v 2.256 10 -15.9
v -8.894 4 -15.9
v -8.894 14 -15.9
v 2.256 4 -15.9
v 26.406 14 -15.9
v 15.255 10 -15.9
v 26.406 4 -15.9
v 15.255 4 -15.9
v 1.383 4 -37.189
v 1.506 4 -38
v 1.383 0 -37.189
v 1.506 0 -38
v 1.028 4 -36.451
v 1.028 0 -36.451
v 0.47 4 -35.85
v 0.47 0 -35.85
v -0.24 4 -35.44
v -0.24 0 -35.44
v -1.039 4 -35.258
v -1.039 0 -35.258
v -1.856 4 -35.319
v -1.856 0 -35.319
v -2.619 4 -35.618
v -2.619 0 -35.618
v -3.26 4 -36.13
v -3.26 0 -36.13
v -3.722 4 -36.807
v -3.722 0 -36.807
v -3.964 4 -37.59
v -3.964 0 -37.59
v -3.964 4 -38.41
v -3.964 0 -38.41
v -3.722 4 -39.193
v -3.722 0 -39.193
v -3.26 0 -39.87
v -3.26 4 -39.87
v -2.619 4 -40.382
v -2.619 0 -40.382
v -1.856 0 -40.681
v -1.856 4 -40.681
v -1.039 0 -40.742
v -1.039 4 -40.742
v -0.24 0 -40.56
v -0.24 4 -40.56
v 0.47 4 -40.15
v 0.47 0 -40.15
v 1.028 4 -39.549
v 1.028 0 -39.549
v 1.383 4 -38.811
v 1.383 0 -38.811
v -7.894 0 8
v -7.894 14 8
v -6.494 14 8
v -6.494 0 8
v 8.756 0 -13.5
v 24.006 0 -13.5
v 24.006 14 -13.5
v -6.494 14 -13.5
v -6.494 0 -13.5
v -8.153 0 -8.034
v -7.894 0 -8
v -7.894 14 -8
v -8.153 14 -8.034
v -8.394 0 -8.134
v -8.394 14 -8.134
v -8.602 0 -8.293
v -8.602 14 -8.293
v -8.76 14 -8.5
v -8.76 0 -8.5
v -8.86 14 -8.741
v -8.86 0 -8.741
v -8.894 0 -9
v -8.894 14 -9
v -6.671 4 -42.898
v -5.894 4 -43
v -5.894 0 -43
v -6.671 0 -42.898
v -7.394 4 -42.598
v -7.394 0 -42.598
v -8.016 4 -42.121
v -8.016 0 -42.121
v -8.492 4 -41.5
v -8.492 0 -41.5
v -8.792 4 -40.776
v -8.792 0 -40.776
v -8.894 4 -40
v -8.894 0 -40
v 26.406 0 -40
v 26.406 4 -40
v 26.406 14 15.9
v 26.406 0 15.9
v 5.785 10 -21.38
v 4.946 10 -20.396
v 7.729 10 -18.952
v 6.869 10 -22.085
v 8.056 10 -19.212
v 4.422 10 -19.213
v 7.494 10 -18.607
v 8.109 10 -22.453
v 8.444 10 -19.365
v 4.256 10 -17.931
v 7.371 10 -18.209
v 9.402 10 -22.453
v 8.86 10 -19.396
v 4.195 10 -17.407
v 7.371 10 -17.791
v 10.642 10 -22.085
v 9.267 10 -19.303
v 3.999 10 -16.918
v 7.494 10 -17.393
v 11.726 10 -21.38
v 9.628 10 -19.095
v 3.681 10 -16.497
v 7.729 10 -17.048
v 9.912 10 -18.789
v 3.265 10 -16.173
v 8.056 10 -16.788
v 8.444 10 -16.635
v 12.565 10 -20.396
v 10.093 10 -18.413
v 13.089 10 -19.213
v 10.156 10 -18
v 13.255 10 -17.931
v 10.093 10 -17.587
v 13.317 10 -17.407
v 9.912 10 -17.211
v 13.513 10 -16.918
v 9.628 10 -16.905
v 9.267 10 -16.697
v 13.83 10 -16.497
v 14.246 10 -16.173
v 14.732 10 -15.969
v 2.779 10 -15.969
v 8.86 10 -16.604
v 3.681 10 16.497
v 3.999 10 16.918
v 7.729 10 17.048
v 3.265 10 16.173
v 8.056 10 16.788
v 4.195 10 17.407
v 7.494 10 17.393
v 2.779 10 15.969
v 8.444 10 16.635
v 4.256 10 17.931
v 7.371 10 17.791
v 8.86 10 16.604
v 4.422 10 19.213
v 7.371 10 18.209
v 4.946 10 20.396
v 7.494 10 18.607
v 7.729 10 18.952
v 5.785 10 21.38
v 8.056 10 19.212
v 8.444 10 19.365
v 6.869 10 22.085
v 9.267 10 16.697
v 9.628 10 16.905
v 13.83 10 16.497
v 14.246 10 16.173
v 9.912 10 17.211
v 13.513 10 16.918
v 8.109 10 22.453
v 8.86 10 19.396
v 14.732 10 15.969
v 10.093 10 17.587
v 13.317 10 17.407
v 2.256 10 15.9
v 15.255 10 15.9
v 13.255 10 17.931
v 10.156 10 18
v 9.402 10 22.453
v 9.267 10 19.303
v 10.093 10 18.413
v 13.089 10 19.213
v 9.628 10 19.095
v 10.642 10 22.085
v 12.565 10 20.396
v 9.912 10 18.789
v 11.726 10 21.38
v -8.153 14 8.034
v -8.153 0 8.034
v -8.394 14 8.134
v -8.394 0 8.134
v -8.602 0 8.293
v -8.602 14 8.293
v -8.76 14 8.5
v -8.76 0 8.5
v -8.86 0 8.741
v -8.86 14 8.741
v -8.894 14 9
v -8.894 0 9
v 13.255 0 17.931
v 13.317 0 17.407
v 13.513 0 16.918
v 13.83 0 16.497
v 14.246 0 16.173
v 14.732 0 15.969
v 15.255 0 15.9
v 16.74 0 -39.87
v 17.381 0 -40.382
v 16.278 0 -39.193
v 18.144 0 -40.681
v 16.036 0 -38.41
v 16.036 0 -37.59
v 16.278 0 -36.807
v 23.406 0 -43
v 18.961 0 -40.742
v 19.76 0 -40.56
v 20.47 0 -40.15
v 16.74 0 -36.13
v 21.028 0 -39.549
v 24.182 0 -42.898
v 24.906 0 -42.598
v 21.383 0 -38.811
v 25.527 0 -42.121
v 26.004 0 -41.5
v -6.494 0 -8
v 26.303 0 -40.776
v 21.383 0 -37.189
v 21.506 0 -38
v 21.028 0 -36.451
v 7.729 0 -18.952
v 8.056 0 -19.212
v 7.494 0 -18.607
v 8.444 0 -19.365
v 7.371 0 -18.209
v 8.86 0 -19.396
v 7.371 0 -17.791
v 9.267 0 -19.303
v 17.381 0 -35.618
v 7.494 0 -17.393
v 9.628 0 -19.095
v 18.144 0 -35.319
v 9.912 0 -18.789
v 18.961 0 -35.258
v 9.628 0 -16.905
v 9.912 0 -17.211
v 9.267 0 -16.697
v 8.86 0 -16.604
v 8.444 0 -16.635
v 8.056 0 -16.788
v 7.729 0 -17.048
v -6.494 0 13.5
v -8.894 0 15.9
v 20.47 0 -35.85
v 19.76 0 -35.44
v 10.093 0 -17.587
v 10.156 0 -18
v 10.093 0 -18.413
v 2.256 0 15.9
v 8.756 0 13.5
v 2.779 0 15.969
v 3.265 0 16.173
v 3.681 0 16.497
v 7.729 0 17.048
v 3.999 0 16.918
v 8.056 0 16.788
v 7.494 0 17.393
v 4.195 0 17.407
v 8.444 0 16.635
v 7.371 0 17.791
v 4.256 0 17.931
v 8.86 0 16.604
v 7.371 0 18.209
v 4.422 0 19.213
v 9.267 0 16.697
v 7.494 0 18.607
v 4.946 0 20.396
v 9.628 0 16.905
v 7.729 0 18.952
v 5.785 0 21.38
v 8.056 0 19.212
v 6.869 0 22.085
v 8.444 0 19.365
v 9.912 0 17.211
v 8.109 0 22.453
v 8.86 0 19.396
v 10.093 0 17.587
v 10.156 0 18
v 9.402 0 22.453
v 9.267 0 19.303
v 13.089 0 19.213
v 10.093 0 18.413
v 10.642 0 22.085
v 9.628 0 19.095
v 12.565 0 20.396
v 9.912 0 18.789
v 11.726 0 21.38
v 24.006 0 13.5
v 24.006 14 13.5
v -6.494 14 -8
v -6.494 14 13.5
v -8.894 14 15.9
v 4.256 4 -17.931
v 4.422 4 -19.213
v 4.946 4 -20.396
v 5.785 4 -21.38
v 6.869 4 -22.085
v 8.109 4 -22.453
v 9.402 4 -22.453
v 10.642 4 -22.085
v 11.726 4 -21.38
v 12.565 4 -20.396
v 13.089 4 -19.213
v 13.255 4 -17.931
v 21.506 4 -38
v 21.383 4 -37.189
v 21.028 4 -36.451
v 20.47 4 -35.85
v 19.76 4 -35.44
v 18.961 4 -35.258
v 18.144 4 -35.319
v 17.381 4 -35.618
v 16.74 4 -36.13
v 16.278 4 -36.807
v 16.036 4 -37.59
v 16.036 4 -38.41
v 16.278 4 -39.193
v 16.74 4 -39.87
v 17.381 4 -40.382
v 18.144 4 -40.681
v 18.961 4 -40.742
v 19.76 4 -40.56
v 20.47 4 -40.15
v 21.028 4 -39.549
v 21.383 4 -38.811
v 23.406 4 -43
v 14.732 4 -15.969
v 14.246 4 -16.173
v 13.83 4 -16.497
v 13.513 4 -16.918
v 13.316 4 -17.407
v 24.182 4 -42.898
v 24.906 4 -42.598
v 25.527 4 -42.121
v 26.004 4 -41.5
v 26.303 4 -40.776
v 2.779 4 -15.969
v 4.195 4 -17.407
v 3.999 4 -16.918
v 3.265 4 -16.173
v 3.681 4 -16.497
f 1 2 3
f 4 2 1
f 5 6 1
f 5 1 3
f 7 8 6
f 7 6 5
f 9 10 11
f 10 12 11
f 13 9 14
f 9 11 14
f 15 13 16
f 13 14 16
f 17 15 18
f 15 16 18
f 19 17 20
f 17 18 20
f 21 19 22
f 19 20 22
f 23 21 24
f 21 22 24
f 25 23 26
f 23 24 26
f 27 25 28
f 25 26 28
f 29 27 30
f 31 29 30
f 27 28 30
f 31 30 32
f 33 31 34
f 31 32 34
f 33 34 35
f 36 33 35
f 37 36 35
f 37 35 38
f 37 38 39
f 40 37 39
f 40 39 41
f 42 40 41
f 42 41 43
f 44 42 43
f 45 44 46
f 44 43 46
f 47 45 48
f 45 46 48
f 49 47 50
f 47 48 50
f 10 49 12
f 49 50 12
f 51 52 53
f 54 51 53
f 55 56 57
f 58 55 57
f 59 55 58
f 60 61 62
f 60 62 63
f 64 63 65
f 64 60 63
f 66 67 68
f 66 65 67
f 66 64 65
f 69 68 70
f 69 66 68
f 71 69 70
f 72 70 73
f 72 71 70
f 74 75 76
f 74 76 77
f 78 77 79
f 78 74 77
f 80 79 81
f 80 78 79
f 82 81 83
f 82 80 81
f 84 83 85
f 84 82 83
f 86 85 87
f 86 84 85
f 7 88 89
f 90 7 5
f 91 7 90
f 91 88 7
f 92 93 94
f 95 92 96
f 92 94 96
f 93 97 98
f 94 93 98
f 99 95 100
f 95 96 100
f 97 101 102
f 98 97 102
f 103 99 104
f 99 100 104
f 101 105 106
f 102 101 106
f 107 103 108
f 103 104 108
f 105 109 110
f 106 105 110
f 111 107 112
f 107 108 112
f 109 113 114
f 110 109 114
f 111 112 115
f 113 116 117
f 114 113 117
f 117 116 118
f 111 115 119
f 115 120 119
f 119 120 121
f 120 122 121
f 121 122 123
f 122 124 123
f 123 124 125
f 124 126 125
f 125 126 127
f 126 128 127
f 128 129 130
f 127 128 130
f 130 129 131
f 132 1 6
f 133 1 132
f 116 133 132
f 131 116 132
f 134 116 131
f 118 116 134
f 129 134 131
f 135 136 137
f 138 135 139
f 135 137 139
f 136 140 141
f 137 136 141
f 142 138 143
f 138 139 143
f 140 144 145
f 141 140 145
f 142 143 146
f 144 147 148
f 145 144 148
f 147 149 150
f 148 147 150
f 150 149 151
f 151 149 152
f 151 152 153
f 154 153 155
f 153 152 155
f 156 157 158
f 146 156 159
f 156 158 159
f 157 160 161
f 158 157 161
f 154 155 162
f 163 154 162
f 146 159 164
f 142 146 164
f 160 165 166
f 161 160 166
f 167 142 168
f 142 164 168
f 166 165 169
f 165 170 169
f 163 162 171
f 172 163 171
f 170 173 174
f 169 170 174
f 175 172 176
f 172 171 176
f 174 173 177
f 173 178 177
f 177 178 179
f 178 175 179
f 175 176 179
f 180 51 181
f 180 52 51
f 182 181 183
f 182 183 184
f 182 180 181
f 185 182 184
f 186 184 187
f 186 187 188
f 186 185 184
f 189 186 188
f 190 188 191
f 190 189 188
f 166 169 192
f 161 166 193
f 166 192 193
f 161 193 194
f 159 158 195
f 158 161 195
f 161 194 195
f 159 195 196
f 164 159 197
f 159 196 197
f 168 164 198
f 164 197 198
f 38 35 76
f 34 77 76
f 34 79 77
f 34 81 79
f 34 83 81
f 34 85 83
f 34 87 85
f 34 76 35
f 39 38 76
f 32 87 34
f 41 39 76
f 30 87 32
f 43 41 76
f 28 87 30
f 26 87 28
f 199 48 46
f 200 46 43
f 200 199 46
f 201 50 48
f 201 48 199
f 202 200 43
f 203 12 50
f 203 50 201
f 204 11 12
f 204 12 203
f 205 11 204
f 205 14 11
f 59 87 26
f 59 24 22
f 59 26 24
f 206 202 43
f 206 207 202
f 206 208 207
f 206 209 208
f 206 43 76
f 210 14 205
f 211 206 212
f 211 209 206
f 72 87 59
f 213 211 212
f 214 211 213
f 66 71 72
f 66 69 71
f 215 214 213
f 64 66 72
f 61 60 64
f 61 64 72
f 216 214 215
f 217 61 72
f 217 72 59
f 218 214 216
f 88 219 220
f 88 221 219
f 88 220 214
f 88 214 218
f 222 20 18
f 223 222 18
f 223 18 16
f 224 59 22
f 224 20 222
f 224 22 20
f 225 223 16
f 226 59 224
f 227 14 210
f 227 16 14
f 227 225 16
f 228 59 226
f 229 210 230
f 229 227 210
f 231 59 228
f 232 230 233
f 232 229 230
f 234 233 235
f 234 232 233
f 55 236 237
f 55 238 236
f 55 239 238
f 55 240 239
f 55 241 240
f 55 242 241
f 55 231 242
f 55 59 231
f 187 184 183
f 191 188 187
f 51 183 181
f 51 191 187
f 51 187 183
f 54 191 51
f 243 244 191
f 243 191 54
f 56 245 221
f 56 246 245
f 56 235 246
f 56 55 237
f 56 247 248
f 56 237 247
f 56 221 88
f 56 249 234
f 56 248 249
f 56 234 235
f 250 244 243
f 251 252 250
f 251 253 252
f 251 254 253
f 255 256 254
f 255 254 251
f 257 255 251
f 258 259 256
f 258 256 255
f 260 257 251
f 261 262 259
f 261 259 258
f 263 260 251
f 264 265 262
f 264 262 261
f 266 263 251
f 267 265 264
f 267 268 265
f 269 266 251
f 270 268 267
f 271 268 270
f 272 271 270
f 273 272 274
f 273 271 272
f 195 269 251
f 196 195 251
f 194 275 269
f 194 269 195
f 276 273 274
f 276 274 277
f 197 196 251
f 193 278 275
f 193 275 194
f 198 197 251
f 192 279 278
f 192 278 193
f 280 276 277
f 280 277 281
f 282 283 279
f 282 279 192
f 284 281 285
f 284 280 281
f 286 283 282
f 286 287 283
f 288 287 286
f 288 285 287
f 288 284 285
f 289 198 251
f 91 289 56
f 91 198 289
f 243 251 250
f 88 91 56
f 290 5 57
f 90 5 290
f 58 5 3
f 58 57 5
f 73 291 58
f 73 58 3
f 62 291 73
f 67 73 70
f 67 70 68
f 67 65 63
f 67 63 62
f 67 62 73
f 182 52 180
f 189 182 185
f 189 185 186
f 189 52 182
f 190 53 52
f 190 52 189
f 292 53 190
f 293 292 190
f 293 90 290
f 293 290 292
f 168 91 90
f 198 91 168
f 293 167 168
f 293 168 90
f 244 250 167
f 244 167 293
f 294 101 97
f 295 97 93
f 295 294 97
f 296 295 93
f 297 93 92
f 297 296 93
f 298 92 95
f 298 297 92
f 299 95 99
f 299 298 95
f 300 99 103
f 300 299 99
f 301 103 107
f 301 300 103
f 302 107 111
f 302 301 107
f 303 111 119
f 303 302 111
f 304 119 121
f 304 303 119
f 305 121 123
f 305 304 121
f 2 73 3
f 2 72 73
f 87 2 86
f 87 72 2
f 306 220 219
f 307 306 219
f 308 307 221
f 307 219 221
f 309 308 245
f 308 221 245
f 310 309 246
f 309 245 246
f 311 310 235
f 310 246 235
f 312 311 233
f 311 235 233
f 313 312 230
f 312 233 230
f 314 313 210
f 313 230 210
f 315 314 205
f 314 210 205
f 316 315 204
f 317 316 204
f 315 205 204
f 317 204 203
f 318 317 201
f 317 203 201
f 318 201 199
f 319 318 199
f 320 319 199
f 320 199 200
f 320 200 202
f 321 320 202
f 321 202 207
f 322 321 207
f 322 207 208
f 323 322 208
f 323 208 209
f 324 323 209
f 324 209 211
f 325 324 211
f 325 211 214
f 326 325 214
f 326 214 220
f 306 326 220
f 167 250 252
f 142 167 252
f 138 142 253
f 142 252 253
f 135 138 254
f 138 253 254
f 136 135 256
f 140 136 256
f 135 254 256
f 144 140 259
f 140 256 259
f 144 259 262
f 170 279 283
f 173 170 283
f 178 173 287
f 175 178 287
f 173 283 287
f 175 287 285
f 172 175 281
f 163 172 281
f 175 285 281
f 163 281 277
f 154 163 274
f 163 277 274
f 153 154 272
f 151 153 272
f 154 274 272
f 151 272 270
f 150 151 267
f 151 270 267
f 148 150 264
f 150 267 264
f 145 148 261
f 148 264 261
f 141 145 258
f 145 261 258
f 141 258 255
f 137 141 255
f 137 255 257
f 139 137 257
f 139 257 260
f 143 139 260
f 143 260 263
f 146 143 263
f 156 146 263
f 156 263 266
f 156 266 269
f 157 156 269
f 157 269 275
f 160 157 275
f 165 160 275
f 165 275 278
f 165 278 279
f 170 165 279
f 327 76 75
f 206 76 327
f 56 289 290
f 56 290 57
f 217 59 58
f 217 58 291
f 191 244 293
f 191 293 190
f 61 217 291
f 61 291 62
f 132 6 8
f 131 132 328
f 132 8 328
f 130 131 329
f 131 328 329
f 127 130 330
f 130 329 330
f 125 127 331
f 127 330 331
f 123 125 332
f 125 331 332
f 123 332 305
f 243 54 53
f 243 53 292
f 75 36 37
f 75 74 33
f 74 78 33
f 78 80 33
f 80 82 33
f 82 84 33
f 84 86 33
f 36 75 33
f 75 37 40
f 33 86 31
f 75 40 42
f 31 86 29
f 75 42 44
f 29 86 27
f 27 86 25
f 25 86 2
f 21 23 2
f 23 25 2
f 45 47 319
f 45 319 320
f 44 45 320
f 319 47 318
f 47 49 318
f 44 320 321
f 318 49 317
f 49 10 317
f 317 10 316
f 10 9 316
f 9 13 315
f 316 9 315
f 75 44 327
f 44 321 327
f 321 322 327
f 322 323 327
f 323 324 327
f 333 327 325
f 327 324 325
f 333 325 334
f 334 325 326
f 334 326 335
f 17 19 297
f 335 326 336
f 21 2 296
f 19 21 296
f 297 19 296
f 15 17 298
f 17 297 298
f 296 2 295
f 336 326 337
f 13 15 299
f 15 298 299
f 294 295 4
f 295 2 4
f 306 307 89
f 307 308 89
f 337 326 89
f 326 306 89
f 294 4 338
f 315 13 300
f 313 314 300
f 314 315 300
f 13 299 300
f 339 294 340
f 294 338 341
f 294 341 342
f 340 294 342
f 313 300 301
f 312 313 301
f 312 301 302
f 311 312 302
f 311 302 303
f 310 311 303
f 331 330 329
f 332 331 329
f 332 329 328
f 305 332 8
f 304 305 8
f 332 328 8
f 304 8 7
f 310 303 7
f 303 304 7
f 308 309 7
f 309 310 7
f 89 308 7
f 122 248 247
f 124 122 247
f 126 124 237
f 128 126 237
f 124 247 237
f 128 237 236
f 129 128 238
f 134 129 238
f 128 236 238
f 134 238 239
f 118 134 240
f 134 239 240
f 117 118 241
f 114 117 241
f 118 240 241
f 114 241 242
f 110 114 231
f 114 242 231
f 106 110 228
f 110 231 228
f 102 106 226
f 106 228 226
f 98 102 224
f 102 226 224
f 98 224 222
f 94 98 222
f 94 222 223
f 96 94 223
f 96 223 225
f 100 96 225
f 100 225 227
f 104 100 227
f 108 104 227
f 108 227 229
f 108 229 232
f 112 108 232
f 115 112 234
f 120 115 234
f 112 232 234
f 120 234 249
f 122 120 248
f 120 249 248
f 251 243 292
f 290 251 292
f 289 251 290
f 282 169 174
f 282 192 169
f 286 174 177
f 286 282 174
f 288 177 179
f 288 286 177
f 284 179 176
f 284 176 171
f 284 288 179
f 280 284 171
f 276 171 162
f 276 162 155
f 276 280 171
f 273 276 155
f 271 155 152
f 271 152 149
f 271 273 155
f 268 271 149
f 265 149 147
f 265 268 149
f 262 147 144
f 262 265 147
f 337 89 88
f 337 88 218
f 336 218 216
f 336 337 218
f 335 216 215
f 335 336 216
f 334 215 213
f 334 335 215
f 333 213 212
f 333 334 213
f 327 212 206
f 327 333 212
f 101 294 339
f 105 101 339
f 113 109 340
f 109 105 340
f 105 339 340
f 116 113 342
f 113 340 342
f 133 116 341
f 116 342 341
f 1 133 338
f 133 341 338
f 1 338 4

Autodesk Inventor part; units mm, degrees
ref_plane "YZ Plane" through (0, 0, 0) normal (1, 0, 0) x (0, 1, 0)
ref_plane "XZ Plane" through (0, 0, 0) normal (0, 1, 0) x (-1, 0, 0)
ref_plane "XY Plane" through (0, 0, 0) normal (0, 0, 1) x (1, 0, 0)
sketch "Sketch1" plane through (0, 0, 0) normal (0, 1, 0) x (-1, 0, 0)
  line L0 (-26.4056, 15.9) -> (8.8944, 15.9)
  line L1 (8.8944, 15.9) -> (8.8944, -15.9)
  line L2 (8.8944, -15.9) -> (-26.4056, -15.9)
  line L3 (-26.4056, -15.9) -> (-26.4056, 15.9)
  line L4 (6.4944, 13.5) -> (-24.0056, 13.5)
  line L5 (-24.0056, 13.5) -> (-24.0056, -13.5)
  line L6 (-24.0056, -13.5) -> (6.4944, -13.5)
  line L7 (6.4944, -13.5) -> (6.4944, 13.5)
  point P0 (0, 0)
  dimension "d4" = 27
  dimension "d5" = 30.5
  dimension "d7" = 2.4
  dimension "d8" = 2.4
  dimension "d9" = 2.4
  dimension "d10" = 2.4
extrude "Extrusion1" add sketch "Sketch1" along normal blind 14
sketch "Sketch2" plane through (0, 0, 0) normal (0, -1, 0) x (1, 0, 0)
  circle A0 centre (8.7556, 18) radius 1.4
  circle A1 centre (8.7556, -18) radius 1.4
  line L0 (24.0056, -13.5) -> (24.0056, 13.5) projected
  circle A2 centre (8.7556, 18) radius 4.5
  circle A3 centre (8.7556, -18) radius 4.5
  line L1 (-6.4944, -13.5) -> (24.0056, -13.5) projected
  point P0 (0, 0)
  dimension "d13" = 36
  dimension "d14" = 15.25
  dimension "d15" = 2.8
  dimension "d16" = 18
extrude "Extrusion2" add sketch "Sketch2" against normal blind 10
fillet "Fillet1" radius 2 4 edges at (12.7355, 5, -15.9) (4.7756, 5, -15.9) (4.7756, 5, 15.9) (12.7355, 5, 15.9)
sketch "Sketch3" plane through (0, 0, 0) normal (0, -1, 0) x (1, 0, 0)
  circle A0 centre (8.7556, -18) radius 1.4 projected
  circle A1 centre (8.7556, 18) radius 1.4 projected
  line L0 (26.4056, -15.9) -> (15.2548, -15.9) projected
  line L1 (26.4056, 15.9) -> (26.4056, -15.9) projected
  line L2 (15.2548, 15.9) -> (26.4056, 15.9) projected
  arc A2 (13.255, 17.9308) -> (15.2548, 15.9) centre (15.2548, 17.9) ccw projected
  arc A3 (13.255, 17.9308) -> (4.2561, 17.9308) centre (8.7556, 18) ccw projected
  arc A4 (2.2563, 15.9) -> (4.2561, 17.9308) centre (2.2563, 17.9) ccw projected
  line L3 (-8.8944, 15.9) -> (2.2563, 15.9) projected
  line L4 (-8.8944, -15.9) -> (-8.8944, 15.9) projected
  line L5 (2.2563, -15.9) -> (-8.8944, -15.9) projected
  arc A5 (4.2561, -17.9308) -> (2.2563, -15.9) centre (2.2563, -17.9) ccw projected
  arc A6 (4.2561, -17.9308) -> (13.255, -17.9308) centre (8.7556, -18) ccw projected
  arc A7 (15.2548, -15.9) -> (13.255, -17.9308) centre (15.2548, -17.9) ccw projected
  line L6 (-6.4944, -13.5) -> (24.0056, -13.5) projected
  line L7 (-6.4944, 13.5) -> (-6.4944, -13.5) projected
  line L8 (24.0056, 13.5) -> (-6.4944, 13.5) projected
  line L9 (24.0056, -13.5) -> (24.0056, 13.5) projected
  line L10 (26.4056, 15.9) -> (26.4056, -15.9) projected
  line L11 (26.4056, -15.9) -> (-8.8944, -15.9)
  line L12 (-8.8944, -15.9) -> (-8.8944, -43)
  line L13 (-8.8944, -43) -> (26.4056, -43)
  line L14 (26.4056, -43) -> (26.4056, -15.9)
  circle A8 centre (18.7556, -38) radius 2.75
  circle A9 centre (-1.2444, -38) radius 2.75
  line L15 (-8.8944, -15.9) -> (-8.8944, 15.9) projected
  point P0 (0, 0)
  dimension "d20" = 5.5
  dimension "d21" = 20
  dimension "d22" = 20
  dimension "d23" = 5
  dimension "d25" = 10
extrude "Extrusion3" add sketch "Sketch3" against normal blind 4 contours L14 L13 L12 L5 A5 A6 A7 L0
fillet "Fillet2" radius 3 2 edges at (26.4056, 2, -43) (-8.8944, 2, -43)
sketch "Sketch4" plane through (0, 14, 0) normal (0, 1, 0) x (1, 0, 0)
  line L0 (-1.1926, 8) -> (-11.7963, 8)
  line L1 (-11.7963, 8) -> (-11.7963, -8)
  line L2 (-11.7963, -8) -> (-1.1926, -8)
  line L3 (-1.1926, -8) -> (-1.1926, 8)
  line L4 (-6.4944, -13.5) -> (-6.4944, 13.5) projected
  line L5 (-1.1926, 8) -> (-11.7963, -8) construction
  line L6 (-11.7963, 8) -> (-1.1926, -8) construction
  point P0 (0, 0)
  point P1 (-6.4944, 0)
  dimension "d29" = 8
extrude "Extrusion4" cut sketch "Sketch4" against normal through all
fillet "Fillet3" radius 1 2 edges at (-8.8944, 7, -8) (-8.8944, 7, 8)
properties part number "SocketMount"
